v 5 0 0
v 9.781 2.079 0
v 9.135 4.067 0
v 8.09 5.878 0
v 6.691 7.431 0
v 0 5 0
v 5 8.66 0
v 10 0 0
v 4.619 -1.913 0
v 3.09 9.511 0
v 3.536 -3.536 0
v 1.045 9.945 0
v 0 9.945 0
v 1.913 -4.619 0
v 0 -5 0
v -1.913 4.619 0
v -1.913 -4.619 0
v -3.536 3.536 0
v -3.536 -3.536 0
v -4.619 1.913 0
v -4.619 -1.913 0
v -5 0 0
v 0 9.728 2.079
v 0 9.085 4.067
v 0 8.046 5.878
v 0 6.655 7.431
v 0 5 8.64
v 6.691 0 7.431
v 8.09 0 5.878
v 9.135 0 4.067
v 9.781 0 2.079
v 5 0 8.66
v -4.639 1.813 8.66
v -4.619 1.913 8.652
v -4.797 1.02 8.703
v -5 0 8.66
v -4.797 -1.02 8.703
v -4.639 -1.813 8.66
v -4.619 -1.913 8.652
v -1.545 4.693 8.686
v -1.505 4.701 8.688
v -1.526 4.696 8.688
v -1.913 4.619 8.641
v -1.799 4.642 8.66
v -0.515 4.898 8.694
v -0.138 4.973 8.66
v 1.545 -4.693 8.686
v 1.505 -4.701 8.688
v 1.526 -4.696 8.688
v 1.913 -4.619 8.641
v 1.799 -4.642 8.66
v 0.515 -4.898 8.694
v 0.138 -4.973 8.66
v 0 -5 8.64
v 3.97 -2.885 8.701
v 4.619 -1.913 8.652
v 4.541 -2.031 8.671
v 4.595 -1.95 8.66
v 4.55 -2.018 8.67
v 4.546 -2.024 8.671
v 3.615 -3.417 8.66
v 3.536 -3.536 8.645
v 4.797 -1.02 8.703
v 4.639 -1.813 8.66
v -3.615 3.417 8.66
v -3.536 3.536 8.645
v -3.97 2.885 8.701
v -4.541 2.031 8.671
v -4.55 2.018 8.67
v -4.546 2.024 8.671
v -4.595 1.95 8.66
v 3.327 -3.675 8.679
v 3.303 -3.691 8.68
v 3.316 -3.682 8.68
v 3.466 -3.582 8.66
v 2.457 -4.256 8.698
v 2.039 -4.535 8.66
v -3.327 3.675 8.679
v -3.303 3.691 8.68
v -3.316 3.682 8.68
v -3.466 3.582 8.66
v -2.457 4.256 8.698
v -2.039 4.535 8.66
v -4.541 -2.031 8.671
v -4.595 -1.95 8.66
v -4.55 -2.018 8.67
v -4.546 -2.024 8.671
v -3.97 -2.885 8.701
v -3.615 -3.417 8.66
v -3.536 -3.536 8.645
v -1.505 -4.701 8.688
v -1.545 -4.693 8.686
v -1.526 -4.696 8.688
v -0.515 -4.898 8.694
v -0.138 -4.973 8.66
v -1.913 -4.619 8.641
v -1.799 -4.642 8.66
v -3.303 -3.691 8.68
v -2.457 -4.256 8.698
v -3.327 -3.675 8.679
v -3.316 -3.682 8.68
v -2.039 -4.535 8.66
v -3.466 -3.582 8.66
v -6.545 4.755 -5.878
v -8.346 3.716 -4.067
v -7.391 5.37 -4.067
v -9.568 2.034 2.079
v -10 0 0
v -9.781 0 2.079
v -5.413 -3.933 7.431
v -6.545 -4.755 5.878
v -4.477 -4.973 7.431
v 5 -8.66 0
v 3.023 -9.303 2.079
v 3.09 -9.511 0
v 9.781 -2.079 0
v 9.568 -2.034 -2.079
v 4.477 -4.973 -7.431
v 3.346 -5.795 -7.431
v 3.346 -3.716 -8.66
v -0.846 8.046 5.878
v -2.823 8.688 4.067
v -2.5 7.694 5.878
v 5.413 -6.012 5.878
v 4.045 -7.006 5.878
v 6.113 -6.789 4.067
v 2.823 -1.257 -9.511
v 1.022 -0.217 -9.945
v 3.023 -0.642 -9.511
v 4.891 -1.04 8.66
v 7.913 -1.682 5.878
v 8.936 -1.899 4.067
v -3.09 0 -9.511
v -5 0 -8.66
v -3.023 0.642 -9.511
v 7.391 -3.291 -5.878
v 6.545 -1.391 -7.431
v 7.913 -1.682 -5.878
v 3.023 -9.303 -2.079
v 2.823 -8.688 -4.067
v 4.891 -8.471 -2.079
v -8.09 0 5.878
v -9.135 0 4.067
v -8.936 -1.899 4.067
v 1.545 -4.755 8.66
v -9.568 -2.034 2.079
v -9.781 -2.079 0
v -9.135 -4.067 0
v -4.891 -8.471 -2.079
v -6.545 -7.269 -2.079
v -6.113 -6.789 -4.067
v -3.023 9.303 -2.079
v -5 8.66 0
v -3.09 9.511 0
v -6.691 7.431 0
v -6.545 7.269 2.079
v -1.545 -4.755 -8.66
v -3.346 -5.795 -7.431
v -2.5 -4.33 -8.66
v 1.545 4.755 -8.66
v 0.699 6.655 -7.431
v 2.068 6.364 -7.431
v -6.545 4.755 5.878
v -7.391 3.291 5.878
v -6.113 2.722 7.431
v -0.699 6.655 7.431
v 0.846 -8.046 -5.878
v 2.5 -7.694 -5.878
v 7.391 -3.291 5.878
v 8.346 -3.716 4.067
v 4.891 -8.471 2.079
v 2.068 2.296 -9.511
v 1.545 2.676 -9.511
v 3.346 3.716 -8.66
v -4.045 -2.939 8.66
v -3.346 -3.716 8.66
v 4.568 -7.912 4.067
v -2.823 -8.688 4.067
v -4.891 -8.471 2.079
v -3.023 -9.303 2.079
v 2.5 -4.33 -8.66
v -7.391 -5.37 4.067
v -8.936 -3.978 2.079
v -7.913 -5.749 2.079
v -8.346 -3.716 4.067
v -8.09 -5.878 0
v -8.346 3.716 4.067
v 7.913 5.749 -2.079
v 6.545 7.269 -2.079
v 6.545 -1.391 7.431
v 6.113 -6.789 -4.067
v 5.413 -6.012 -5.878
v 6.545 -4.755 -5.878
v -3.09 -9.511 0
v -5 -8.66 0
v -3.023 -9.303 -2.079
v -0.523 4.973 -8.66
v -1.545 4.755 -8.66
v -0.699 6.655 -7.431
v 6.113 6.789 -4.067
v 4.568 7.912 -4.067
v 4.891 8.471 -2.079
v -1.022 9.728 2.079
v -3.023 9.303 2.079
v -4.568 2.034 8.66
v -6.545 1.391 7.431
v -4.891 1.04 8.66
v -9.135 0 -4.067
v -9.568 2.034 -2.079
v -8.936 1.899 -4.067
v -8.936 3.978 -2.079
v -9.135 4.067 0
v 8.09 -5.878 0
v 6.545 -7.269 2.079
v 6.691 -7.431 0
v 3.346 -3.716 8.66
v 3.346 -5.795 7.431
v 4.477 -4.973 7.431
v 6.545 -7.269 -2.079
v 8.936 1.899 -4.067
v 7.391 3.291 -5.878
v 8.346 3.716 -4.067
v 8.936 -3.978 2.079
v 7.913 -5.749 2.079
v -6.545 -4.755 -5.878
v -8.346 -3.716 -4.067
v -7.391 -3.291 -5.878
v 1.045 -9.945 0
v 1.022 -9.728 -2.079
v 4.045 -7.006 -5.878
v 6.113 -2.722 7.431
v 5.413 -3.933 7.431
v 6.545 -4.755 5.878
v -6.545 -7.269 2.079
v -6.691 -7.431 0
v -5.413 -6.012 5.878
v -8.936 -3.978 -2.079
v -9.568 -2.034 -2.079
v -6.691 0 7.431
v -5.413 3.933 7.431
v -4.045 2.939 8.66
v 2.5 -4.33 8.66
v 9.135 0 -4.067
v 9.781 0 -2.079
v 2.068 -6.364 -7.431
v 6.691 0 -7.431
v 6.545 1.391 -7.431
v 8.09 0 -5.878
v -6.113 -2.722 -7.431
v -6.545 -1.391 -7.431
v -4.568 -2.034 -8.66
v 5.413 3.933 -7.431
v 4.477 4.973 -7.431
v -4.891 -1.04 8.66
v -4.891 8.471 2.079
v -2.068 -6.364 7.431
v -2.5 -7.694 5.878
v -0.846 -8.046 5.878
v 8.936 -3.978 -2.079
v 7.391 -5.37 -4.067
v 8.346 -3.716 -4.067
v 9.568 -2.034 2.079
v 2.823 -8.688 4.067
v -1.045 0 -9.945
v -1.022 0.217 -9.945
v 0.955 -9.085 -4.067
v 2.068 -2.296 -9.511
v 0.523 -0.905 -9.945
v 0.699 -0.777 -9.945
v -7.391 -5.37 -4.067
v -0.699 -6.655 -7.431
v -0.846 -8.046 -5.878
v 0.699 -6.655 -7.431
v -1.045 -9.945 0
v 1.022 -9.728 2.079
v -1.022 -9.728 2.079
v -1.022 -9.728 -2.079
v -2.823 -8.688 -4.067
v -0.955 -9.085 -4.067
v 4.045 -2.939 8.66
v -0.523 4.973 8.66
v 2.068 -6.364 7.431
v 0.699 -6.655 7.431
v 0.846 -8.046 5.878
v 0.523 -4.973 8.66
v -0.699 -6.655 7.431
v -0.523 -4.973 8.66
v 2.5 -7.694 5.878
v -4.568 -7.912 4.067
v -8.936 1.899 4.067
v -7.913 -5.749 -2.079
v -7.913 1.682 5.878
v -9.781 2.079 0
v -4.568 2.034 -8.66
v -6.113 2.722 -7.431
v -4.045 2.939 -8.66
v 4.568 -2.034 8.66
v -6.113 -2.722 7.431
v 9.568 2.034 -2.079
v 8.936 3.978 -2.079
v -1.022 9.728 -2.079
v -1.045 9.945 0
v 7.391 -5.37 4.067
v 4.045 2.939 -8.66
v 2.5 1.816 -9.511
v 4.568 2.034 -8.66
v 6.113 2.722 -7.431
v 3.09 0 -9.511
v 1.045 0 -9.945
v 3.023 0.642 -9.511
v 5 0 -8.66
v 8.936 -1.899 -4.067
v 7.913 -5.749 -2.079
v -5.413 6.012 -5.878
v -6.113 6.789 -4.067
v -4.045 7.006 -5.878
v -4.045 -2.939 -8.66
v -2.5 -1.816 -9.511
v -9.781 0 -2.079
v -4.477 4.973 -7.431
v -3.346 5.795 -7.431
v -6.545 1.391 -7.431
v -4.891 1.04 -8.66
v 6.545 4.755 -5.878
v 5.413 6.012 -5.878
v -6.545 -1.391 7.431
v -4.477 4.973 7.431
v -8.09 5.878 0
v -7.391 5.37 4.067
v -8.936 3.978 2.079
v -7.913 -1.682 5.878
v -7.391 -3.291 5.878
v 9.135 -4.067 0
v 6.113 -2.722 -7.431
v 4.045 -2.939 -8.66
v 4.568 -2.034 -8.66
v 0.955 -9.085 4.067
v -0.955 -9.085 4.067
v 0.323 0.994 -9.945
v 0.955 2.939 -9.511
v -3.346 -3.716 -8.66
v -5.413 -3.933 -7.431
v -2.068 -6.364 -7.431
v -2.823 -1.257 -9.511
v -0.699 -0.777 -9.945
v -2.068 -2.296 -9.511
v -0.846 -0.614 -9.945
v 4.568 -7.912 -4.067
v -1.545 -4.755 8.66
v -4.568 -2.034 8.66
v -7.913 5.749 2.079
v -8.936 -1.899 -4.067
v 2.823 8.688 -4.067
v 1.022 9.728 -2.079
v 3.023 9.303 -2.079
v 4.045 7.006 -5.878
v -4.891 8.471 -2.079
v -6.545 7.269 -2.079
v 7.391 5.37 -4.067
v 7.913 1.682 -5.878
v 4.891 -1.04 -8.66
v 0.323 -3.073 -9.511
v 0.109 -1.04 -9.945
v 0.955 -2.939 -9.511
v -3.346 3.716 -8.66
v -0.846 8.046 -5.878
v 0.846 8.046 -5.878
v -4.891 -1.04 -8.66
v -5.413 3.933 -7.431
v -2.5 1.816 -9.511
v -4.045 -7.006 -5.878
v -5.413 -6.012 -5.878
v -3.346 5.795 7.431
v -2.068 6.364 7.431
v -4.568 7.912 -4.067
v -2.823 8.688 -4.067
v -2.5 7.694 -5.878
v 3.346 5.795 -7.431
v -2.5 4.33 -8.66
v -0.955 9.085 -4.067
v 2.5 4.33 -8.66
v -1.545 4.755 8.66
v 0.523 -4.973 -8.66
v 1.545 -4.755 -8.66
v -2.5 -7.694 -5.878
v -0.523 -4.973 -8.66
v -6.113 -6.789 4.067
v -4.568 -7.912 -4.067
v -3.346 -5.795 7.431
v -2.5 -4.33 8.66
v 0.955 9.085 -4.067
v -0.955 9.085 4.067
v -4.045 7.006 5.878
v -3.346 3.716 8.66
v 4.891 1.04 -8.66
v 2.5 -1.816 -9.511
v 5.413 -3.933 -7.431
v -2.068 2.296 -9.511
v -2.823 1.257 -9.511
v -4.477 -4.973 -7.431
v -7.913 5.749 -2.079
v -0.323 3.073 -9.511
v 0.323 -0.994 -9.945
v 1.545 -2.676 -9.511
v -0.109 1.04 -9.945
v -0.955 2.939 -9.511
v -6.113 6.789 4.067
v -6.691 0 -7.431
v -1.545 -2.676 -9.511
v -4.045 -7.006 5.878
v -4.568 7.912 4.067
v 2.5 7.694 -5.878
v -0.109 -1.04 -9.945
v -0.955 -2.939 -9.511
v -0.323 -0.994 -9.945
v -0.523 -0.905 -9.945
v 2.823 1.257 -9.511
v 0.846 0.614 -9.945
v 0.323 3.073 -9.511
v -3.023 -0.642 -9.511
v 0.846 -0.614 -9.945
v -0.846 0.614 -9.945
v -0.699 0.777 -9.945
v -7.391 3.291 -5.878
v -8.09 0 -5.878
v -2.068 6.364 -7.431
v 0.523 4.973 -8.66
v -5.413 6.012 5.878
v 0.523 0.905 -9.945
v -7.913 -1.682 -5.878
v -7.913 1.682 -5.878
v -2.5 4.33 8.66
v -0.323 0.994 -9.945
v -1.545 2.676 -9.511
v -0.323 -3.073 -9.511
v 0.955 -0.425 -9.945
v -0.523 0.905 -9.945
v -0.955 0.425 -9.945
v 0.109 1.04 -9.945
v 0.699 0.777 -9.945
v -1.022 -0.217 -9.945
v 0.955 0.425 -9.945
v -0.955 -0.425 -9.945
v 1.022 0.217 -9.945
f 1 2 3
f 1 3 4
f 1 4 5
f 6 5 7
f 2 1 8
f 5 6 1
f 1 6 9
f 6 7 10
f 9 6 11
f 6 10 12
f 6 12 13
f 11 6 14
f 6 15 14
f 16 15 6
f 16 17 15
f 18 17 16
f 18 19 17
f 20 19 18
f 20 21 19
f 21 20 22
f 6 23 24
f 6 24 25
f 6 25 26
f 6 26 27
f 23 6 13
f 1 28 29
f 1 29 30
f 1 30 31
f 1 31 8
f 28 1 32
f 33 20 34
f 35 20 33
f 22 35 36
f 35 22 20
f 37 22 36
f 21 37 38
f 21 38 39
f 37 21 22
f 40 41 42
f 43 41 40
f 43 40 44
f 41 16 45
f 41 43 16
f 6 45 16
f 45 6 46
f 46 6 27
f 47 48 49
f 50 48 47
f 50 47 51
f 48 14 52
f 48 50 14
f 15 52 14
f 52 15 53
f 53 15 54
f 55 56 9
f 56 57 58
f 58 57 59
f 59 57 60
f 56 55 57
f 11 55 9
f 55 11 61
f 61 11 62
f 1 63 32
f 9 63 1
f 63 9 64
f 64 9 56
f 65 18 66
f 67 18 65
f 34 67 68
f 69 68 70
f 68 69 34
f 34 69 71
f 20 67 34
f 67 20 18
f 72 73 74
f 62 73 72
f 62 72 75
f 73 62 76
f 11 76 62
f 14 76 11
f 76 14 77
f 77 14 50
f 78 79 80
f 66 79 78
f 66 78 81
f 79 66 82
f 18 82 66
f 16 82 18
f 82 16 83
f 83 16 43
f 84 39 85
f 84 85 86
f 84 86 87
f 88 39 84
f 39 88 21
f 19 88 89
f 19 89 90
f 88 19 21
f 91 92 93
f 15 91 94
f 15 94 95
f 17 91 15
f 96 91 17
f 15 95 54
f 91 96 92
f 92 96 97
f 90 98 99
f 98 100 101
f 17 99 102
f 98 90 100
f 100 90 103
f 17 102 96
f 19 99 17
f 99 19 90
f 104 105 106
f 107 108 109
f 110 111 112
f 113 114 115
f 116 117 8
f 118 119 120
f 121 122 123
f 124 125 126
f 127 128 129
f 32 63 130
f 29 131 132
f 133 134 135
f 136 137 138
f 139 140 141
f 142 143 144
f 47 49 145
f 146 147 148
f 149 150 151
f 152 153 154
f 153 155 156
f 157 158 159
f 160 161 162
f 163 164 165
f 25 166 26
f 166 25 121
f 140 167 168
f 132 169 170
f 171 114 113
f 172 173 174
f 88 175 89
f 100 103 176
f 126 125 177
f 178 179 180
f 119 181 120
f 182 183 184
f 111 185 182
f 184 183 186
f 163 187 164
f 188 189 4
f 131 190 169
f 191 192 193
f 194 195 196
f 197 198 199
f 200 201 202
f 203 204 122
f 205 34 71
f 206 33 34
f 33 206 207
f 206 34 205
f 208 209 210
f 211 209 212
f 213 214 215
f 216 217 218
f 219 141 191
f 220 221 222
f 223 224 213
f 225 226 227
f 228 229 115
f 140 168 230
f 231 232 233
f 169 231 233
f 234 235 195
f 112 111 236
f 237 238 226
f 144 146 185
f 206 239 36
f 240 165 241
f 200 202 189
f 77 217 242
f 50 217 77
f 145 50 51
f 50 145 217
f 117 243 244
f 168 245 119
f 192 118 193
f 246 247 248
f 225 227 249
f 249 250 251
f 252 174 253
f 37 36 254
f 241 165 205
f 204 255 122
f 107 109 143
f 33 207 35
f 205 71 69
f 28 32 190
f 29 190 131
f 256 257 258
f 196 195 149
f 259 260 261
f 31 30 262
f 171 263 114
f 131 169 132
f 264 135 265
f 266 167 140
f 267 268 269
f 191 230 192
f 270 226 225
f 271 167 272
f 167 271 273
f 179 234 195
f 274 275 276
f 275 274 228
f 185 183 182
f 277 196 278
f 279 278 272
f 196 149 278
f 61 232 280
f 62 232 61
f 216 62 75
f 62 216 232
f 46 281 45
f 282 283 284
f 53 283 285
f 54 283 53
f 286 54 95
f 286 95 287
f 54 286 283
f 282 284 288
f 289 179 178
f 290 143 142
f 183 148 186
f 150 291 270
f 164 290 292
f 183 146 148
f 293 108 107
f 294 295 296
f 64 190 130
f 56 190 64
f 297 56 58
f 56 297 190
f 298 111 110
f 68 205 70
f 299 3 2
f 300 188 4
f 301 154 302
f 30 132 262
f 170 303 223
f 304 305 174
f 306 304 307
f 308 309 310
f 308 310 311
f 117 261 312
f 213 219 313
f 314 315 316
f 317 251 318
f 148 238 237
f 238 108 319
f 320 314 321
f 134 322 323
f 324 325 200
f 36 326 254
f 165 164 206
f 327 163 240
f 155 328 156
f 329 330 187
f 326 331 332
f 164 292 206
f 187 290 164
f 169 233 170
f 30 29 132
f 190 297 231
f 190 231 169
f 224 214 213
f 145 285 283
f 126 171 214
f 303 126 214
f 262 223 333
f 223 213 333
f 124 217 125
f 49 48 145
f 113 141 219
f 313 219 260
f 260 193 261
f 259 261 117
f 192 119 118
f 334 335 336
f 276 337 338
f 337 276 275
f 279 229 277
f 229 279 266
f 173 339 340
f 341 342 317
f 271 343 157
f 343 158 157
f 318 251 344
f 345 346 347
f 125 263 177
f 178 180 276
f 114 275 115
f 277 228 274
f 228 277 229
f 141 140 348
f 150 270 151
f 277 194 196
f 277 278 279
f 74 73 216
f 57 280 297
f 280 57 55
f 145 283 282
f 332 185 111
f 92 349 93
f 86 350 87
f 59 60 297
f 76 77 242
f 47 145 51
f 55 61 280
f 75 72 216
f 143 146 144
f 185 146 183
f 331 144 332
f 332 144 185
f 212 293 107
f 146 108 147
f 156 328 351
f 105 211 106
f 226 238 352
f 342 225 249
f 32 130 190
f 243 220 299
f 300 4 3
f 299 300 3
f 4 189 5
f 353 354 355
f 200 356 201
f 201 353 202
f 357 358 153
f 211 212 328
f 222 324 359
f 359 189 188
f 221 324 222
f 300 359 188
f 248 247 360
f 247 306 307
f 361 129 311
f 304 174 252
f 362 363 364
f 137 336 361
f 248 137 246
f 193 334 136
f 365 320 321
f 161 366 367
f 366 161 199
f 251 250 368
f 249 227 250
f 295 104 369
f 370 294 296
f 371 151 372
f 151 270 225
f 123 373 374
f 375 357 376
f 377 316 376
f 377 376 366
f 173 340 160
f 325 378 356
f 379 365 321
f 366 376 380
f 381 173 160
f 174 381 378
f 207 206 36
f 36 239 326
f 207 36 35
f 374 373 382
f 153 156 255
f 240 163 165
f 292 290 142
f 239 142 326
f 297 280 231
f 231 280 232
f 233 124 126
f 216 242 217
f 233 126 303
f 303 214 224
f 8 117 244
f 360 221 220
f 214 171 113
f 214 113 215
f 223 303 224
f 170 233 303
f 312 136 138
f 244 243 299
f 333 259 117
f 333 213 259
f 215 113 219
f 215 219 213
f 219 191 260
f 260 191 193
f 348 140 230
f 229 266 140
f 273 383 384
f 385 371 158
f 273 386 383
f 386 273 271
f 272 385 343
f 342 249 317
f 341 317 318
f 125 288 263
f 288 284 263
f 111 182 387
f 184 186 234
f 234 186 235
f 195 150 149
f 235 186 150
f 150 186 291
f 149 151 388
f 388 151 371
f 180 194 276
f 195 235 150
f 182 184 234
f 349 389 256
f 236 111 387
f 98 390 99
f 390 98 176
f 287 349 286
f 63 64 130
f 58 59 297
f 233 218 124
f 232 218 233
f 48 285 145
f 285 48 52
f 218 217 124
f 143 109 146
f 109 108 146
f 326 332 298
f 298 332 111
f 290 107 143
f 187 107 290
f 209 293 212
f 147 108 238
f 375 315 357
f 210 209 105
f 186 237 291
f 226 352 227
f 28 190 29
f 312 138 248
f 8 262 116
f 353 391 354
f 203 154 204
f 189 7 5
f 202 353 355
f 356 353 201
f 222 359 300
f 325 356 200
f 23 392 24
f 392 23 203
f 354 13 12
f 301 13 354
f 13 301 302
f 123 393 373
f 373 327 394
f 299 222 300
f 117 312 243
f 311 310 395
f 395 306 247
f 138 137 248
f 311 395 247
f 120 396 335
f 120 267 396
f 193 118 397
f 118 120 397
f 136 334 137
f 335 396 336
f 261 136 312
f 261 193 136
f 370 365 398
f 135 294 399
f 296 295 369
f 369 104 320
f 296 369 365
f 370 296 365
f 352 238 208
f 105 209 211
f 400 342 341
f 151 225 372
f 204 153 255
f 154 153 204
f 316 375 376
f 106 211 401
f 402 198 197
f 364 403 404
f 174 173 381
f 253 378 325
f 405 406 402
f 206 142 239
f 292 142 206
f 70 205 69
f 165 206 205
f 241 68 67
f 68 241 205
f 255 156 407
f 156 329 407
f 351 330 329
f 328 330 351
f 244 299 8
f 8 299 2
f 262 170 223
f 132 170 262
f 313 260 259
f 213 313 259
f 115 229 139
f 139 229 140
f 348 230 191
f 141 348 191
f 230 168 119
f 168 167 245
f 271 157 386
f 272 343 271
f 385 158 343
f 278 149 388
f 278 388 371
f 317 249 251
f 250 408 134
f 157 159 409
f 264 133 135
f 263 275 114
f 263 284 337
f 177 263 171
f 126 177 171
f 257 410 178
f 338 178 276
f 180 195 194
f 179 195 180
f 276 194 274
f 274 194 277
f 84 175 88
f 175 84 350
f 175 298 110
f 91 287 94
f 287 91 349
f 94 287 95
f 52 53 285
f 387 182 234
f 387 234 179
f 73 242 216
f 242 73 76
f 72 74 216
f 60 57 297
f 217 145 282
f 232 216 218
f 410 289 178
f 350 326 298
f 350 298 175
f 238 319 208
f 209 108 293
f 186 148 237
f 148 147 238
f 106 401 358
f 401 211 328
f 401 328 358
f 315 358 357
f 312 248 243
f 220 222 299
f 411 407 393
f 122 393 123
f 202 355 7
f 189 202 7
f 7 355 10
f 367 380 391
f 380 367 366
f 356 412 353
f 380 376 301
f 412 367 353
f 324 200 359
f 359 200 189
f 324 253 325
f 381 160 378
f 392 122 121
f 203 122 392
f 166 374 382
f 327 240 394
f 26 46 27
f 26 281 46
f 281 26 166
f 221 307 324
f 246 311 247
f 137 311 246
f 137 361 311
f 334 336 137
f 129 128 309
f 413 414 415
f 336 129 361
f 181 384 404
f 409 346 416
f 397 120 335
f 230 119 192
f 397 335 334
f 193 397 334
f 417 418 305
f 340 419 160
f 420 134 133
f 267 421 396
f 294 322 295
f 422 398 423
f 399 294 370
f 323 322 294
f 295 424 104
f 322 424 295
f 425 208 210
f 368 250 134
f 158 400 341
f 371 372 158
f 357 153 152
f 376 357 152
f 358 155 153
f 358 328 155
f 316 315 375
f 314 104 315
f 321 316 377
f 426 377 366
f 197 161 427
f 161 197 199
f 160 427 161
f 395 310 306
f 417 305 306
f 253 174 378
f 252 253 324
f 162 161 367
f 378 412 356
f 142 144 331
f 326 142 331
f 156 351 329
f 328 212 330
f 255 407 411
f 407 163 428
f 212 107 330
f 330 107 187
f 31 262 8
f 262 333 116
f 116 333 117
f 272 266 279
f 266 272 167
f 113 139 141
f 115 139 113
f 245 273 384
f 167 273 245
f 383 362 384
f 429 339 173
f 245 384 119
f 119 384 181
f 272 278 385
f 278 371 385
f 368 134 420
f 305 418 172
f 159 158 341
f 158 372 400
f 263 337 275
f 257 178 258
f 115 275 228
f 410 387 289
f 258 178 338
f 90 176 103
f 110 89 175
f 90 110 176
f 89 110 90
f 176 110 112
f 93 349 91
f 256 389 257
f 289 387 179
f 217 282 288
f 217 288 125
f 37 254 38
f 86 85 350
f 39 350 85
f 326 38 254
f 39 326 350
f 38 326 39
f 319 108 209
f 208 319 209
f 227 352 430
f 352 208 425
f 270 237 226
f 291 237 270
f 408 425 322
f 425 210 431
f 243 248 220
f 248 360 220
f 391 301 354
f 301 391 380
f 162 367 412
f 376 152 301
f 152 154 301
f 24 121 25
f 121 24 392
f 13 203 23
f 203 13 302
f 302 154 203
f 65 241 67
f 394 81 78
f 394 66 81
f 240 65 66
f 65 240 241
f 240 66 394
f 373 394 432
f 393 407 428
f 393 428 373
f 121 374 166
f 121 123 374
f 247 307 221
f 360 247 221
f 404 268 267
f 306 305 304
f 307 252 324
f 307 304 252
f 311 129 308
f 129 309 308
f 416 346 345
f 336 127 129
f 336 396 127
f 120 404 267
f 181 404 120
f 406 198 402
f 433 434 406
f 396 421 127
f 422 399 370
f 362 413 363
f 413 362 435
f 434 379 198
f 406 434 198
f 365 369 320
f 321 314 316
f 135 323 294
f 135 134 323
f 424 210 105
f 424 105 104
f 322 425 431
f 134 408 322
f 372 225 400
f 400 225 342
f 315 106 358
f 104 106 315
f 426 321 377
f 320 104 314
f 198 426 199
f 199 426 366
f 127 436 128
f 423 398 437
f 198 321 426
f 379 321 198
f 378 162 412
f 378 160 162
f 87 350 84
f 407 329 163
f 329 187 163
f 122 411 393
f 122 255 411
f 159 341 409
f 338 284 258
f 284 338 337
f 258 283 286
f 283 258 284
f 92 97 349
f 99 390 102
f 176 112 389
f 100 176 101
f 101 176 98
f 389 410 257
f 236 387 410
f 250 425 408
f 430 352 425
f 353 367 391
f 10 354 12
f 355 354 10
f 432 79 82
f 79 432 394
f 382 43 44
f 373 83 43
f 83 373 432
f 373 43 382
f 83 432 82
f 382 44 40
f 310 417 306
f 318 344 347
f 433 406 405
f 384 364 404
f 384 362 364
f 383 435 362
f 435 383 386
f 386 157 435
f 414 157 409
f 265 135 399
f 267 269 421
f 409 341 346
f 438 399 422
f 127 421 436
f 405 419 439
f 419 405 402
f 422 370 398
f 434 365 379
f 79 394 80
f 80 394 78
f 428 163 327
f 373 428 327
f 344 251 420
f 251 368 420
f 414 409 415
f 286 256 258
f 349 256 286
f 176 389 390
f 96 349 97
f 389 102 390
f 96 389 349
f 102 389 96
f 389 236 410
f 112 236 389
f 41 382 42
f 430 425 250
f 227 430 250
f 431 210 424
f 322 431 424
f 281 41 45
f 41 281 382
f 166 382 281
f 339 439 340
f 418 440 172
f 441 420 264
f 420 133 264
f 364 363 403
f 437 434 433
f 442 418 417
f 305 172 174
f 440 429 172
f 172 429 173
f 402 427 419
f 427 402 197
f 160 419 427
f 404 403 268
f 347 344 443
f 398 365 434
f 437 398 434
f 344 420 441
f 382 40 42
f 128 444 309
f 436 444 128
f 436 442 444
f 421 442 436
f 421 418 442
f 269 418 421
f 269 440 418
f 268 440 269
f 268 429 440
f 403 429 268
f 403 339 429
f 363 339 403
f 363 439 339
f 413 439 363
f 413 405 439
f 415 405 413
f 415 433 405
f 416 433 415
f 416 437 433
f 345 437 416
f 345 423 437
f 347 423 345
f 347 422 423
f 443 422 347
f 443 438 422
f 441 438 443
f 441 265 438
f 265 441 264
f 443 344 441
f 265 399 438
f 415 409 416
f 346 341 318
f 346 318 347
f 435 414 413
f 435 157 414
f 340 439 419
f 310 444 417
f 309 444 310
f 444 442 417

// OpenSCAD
difference() {
  sphere(10);
  render() {
    cube([15,15,15]);
    cylinder(h=15, r=5);
  }
  %color([0.5,0.5,1], alpha=0.3) render() {
    cube([15,15,15]);
    cylinder(h=15, r=5);
  }
}
